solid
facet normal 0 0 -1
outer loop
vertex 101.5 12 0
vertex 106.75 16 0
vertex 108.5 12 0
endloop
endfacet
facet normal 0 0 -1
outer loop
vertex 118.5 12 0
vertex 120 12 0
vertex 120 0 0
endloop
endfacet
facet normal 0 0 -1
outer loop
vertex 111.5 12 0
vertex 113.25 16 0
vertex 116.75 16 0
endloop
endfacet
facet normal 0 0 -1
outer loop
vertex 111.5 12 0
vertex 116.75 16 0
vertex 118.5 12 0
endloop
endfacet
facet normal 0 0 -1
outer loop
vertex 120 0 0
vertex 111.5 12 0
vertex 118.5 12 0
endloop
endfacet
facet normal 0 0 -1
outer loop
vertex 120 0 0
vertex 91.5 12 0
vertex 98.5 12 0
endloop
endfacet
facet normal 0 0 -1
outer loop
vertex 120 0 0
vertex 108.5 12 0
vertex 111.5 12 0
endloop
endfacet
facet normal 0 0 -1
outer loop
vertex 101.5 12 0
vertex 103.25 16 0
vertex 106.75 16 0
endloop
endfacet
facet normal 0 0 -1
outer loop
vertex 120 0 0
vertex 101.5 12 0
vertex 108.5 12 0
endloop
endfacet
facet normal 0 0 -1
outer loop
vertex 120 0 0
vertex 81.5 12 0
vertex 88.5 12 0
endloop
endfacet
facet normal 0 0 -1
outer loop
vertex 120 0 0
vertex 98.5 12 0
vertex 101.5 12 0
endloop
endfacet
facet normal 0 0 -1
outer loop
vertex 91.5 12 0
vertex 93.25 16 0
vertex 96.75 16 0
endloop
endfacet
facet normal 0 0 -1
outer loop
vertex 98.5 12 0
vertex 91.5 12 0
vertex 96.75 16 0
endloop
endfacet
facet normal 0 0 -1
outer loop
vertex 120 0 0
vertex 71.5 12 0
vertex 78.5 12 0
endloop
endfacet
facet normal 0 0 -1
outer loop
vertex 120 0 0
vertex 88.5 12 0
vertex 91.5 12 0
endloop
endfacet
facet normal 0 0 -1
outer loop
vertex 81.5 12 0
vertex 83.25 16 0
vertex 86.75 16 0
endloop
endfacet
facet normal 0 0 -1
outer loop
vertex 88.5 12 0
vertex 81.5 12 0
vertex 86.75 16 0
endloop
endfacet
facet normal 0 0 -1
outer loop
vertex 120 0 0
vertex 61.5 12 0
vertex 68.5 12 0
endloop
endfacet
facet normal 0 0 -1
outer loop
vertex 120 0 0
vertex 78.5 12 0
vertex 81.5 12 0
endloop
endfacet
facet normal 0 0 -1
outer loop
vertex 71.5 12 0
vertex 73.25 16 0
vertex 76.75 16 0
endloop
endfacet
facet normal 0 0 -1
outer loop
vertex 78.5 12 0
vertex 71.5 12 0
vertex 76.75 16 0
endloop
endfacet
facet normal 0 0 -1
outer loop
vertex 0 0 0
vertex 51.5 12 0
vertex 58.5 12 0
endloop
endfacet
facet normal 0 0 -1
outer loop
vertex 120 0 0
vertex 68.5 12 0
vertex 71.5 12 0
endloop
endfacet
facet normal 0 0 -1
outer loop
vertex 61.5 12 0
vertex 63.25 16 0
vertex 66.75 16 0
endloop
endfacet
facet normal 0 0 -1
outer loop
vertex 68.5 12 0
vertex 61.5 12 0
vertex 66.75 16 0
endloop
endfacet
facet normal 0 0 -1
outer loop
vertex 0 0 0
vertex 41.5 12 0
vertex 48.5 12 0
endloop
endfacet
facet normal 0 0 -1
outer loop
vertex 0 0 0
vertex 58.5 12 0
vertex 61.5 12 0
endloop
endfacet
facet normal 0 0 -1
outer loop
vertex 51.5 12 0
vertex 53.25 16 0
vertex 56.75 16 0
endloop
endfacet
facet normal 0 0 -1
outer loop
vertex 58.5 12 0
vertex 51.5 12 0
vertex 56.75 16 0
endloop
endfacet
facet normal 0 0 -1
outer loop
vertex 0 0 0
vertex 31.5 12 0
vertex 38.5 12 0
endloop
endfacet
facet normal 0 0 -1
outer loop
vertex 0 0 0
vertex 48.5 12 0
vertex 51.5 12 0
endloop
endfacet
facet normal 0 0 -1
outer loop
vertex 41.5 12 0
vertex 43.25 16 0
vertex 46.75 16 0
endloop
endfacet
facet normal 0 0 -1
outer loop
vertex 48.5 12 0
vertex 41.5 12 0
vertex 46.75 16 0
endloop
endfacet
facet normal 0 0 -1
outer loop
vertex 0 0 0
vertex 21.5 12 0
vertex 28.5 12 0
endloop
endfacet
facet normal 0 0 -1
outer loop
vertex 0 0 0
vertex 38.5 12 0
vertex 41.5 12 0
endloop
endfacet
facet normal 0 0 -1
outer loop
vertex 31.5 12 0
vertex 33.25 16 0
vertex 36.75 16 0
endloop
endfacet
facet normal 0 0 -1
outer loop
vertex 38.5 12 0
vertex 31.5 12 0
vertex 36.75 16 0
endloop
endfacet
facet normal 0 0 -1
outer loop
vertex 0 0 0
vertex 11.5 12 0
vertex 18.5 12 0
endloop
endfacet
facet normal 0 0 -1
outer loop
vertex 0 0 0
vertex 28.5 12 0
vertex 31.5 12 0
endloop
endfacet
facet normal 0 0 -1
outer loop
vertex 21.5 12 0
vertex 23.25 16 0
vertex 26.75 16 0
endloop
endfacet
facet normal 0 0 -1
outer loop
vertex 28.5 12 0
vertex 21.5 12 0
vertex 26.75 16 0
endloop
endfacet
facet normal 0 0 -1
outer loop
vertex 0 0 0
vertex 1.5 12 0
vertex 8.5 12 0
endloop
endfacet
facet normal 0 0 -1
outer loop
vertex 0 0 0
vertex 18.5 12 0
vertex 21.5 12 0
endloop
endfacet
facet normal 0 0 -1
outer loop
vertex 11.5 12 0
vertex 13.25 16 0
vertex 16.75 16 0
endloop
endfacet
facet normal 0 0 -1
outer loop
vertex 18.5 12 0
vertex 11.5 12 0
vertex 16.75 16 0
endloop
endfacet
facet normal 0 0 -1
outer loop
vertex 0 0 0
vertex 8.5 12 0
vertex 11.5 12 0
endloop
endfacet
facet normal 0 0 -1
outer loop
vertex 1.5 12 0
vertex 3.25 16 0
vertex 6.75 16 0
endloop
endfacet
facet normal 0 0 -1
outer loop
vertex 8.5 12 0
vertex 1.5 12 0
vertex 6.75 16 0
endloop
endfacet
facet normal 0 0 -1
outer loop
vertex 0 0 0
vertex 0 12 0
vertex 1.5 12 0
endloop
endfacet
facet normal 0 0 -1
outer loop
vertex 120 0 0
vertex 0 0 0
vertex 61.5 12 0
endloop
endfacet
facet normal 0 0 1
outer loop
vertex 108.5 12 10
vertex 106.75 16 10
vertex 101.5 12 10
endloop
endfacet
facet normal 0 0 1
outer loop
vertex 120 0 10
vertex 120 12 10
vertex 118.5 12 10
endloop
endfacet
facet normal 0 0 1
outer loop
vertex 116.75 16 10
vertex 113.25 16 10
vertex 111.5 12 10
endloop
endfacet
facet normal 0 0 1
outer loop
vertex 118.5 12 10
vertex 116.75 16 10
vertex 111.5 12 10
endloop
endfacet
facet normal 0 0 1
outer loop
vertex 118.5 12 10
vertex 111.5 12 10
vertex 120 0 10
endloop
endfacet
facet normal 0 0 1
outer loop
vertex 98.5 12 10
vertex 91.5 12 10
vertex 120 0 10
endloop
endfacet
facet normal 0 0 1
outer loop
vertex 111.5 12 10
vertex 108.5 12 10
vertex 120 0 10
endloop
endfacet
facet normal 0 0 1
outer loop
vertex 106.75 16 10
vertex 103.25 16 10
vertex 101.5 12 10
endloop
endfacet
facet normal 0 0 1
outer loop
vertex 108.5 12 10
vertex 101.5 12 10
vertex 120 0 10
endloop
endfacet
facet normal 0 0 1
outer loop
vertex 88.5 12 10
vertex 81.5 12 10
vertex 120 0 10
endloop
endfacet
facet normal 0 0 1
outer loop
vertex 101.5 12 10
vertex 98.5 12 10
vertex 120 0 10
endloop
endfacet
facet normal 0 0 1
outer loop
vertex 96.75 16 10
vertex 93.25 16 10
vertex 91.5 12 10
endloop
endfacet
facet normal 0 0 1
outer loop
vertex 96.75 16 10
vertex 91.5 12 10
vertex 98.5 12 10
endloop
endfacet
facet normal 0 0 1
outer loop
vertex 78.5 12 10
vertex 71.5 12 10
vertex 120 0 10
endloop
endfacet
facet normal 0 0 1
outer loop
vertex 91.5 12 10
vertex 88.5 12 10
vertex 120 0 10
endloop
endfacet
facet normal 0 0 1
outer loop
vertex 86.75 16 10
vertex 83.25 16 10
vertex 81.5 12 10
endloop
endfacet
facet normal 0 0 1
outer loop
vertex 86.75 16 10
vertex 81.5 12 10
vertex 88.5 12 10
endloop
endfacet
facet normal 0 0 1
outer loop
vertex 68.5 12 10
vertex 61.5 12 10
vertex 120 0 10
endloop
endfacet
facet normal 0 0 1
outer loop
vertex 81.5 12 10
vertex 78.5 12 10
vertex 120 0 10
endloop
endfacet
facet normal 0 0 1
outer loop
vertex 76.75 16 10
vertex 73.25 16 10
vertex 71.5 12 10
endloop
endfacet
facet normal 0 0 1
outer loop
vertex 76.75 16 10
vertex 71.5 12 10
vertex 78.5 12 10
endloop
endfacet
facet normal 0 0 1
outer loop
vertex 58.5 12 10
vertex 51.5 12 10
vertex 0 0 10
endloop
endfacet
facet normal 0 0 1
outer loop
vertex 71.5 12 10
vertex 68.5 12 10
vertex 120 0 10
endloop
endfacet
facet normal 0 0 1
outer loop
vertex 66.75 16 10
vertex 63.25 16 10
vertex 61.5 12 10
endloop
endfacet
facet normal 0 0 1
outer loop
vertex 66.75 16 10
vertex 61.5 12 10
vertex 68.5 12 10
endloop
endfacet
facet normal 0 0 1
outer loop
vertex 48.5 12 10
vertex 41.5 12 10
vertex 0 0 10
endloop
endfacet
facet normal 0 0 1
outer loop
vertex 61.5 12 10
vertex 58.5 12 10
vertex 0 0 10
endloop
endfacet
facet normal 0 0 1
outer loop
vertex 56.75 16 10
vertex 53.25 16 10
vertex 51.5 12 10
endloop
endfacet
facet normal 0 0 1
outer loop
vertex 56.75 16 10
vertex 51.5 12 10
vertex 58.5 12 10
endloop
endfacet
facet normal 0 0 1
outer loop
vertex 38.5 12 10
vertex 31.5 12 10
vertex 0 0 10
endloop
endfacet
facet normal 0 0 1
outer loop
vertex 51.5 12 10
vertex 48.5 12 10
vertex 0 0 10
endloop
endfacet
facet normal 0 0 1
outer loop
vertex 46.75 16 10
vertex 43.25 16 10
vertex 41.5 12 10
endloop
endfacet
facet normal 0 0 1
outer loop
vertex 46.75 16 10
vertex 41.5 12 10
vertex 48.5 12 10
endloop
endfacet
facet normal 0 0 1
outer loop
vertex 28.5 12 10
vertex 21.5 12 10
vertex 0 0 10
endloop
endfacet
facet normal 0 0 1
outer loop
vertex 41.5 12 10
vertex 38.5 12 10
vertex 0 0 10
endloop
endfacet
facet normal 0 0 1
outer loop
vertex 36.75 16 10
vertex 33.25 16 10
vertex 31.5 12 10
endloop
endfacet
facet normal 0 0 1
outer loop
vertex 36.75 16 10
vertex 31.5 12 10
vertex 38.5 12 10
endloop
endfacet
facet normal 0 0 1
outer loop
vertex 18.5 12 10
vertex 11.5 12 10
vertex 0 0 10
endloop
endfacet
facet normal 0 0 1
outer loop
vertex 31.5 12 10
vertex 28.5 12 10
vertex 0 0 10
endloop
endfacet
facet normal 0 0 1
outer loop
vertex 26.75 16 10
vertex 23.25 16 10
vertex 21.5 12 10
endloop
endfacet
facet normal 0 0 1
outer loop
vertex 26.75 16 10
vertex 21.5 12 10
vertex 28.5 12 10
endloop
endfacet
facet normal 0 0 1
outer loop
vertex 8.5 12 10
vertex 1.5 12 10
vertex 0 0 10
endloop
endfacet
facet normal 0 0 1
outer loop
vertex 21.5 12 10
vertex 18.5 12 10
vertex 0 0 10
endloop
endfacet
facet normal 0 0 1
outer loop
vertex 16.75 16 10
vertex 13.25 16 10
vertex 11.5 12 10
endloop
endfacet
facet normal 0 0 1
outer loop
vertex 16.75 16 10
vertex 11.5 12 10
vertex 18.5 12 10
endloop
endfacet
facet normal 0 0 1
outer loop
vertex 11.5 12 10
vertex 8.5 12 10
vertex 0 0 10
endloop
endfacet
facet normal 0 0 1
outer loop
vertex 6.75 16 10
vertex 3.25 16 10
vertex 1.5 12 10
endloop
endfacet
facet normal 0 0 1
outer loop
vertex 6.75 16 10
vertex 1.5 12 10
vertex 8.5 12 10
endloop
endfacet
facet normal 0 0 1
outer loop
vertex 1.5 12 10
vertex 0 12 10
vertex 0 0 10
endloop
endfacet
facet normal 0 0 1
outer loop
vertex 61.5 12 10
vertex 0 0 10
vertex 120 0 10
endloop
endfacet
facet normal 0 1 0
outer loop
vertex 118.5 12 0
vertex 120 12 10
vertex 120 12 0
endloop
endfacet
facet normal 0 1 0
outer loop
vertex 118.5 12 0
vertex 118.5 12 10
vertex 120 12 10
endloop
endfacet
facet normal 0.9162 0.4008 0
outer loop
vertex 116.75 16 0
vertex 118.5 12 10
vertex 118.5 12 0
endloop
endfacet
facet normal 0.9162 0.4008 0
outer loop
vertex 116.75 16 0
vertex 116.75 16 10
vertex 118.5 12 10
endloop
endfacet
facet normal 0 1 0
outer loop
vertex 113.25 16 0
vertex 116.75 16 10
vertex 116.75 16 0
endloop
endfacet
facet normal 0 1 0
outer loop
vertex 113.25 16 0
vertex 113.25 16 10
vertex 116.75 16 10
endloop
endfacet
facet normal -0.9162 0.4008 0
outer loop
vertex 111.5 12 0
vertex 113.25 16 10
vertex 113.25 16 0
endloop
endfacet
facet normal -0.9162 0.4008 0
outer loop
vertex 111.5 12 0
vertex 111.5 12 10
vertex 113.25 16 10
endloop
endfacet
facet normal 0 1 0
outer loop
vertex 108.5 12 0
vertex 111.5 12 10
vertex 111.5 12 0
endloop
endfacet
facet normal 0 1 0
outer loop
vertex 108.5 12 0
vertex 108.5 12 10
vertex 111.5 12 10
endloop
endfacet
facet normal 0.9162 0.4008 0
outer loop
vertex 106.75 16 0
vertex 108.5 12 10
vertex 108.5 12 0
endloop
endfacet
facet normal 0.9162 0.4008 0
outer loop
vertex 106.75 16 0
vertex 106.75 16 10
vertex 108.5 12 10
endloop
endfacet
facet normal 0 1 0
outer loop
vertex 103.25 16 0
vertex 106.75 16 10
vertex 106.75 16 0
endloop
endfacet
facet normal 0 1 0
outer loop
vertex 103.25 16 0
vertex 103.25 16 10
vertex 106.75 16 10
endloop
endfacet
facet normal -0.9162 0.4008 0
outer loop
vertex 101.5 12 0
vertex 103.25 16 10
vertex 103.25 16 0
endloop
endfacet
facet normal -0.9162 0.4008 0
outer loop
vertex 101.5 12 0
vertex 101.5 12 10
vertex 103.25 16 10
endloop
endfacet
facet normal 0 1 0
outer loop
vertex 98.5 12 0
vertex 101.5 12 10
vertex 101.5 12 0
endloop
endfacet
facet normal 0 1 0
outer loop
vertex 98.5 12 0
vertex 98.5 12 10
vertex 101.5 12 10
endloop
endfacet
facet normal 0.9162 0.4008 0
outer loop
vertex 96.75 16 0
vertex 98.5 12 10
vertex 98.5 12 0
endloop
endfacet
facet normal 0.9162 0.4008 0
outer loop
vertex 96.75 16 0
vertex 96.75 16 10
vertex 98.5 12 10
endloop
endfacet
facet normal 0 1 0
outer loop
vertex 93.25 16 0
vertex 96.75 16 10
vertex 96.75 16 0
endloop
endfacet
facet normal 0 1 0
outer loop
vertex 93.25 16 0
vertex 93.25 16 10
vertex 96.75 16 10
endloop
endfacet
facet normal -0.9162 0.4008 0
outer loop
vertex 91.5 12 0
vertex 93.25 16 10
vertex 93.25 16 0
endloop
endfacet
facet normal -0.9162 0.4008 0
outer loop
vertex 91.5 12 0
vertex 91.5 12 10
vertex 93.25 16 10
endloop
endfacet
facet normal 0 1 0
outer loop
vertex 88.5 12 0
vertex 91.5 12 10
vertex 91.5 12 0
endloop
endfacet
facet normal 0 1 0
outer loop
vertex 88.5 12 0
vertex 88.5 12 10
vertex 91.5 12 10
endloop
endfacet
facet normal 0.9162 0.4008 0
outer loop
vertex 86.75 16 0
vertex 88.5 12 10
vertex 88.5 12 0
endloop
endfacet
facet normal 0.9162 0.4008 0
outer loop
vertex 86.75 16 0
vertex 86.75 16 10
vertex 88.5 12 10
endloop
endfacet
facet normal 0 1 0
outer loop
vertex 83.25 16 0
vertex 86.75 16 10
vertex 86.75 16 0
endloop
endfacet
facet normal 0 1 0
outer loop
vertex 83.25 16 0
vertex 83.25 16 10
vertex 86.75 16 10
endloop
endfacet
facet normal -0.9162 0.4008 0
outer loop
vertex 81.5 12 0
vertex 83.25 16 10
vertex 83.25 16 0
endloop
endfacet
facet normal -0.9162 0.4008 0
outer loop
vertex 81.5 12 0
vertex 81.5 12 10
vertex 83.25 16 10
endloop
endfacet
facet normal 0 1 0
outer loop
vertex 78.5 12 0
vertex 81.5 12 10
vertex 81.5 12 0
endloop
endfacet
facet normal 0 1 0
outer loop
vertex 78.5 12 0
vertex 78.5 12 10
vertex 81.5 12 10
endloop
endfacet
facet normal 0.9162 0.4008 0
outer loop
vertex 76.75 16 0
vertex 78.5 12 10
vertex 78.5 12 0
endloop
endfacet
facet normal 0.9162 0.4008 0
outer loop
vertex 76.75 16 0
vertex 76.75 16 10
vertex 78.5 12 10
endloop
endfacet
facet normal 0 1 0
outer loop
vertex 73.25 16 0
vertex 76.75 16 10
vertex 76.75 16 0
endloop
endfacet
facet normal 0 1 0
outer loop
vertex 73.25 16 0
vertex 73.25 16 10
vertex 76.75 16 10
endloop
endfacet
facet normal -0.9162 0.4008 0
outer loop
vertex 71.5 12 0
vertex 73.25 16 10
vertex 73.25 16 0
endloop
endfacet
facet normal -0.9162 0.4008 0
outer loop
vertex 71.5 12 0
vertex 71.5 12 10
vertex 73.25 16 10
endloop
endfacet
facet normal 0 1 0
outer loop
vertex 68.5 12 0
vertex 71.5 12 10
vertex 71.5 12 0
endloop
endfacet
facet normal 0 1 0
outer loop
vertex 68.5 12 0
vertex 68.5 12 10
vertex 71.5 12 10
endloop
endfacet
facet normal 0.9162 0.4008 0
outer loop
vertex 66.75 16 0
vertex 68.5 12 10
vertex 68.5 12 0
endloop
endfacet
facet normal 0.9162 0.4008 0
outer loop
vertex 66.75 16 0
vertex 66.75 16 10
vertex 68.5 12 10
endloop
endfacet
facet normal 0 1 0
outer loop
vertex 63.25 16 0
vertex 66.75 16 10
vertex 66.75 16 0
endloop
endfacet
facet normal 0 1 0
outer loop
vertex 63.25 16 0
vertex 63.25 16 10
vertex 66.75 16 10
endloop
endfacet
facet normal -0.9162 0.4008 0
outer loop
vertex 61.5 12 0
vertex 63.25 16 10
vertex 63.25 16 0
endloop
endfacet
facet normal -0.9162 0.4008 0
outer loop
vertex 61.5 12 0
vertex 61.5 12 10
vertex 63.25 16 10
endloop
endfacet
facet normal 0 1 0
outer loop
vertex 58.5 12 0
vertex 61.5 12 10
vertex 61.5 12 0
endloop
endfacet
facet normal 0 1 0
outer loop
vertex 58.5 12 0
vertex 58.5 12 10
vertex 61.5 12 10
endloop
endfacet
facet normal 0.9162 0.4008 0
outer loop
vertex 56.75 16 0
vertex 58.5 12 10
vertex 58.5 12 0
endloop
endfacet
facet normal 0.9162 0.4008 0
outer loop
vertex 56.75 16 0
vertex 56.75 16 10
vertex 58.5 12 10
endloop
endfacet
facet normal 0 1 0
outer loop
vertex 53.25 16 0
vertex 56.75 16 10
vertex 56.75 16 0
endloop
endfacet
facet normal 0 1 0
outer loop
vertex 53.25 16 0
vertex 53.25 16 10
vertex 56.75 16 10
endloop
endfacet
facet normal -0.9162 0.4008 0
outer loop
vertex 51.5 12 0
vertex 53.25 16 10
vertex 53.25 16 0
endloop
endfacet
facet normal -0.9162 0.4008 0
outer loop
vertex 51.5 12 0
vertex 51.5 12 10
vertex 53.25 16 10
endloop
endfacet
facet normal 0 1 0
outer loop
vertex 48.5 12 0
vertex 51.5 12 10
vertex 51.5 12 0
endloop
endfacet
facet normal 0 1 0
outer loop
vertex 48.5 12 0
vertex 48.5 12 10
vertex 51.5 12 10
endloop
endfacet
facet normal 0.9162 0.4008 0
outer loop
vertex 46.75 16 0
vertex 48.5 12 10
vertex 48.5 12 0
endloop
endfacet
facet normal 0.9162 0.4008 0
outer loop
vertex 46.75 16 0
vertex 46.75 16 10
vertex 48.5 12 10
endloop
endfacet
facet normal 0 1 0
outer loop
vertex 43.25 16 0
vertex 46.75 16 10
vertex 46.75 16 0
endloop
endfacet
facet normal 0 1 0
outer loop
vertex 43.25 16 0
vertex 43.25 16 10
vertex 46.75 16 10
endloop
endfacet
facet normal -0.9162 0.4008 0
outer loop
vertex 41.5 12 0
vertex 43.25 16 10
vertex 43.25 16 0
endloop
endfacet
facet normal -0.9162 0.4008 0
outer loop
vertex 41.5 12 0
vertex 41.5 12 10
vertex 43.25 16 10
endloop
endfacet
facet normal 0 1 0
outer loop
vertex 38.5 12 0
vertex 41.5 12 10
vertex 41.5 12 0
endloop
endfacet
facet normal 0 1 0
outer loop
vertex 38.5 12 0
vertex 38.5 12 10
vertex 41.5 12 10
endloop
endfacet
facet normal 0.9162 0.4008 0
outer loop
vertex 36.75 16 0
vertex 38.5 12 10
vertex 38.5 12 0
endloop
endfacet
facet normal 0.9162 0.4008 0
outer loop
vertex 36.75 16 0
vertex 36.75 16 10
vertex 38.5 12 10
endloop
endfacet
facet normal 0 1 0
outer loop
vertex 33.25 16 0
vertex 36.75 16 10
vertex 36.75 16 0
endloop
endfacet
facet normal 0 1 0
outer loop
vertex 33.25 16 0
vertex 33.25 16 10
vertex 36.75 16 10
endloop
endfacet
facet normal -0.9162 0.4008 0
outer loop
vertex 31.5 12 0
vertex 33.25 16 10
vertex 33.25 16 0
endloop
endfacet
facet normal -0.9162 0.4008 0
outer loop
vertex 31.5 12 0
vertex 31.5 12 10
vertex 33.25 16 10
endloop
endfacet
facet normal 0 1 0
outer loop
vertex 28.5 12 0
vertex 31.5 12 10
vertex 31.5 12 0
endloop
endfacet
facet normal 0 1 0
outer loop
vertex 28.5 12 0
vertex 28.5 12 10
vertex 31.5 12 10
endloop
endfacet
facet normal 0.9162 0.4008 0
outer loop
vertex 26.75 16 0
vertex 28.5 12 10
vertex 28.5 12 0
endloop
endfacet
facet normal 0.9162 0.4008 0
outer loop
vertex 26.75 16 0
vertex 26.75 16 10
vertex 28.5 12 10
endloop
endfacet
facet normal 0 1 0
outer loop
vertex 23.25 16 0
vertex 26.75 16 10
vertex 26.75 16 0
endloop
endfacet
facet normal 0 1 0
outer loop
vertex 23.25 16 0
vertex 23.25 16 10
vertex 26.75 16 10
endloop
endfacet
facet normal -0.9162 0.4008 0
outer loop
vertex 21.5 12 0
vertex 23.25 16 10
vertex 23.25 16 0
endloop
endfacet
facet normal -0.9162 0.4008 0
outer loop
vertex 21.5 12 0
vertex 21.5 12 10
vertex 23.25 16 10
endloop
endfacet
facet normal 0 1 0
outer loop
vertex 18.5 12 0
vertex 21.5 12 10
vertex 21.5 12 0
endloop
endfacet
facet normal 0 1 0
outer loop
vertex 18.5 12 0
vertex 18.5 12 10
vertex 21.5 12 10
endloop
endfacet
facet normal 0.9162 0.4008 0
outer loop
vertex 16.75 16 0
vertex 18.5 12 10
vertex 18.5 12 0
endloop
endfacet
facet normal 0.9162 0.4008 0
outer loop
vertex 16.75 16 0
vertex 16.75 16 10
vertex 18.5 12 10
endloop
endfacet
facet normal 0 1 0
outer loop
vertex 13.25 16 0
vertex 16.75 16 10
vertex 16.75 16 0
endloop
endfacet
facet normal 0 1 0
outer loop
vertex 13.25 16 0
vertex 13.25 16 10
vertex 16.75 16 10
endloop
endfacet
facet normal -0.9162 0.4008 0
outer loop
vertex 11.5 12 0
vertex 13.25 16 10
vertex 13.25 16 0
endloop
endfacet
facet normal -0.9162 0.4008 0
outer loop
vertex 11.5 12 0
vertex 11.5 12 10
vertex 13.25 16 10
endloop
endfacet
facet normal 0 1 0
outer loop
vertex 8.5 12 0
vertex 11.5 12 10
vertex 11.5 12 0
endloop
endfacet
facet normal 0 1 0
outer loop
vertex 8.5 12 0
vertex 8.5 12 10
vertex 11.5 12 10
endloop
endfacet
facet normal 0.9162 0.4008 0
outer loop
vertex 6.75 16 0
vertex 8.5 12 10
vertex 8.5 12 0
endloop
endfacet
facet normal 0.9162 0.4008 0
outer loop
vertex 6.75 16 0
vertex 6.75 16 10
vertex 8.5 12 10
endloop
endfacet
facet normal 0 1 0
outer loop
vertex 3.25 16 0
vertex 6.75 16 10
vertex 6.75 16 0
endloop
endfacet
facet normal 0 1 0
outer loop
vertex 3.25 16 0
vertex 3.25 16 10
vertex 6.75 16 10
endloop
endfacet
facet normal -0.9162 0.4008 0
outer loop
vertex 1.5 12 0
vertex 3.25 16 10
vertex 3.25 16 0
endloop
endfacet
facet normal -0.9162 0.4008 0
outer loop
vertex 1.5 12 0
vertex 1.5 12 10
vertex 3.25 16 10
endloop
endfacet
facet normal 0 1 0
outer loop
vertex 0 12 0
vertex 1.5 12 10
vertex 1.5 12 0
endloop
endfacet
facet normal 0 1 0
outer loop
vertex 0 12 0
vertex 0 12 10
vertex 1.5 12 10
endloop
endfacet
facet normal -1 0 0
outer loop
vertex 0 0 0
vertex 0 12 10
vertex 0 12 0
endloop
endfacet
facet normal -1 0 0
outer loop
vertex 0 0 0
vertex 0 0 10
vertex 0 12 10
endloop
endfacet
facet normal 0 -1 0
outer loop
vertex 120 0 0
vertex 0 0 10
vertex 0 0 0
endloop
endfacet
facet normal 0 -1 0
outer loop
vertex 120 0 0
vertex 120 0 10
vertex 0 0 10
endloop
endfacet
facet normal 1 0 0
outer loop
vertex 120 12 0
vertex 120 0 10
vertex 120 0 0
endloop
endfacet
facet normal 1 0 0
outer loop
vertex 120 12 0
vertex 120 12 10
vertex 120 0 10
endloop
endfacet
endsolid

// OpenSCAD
$fn = 32;

// ----------------------------------------------------------------------
// Gear rack: 12 teeth, pitch 10 mm
// ----------------------------------------------------------------------

// --- parameters (mm) ---
teeth = 12;               // number of teeth
pitch = 10;               // tooth pitch, X
root_w = 7;               // tooth width at the root
tip_w = 3.5;              // tooth width at the tip
base_h = 12;              // rack body height, Y
tooth_h = 4;              // tooth height above the body
plate_t = 10;             // rack width, Z (extrusion height)

rack_l = teeth * pitch;  // overall length
total_h = base_h + tooth_h;  // overall height

profile = [[0, 0], [120, 0], [120, 12], [118.5, 12], [116.75, 16], [113.25, 16], [111.5, 12], [108.5, 12], [106.75, 16], [103.25, 16], [101.5, 12], [98.5, 12], [96.75, 16], [93.25, 16], [91.5, 12], [88.5, 12], [86.75, 16], [83.25, 16], [81.5, 12], [78.5, 12], [76.75, 16], [73.25, 16], [71.5, 12], [68.5, 12], [66.75, 16], [63.25, 16], [61.5, 12], [58.5, 12], [56.75, 16], [53.25, 16], [51.5, 12], [48.5, 12], [46.75, 16], [43.25, 16], [41.5, 12], [38.5, 12], [36.75, 16], [33.25, 16], [31.5, 12], [28.5, 12], [26.75, 16], [23.25, 16], [21.5, 12], [18.5, 12], [16.75, 16], [13.25, 16], [11.5, 12], [8.5, 12], [6.75, 16], [3.25, 16], [1.5, 12], [0, 12]];  // primary outline, 52 points, counter clockwise

// --- the one profile operation ---
linear_extrude(height = plate_t) polygon(points = profile);
